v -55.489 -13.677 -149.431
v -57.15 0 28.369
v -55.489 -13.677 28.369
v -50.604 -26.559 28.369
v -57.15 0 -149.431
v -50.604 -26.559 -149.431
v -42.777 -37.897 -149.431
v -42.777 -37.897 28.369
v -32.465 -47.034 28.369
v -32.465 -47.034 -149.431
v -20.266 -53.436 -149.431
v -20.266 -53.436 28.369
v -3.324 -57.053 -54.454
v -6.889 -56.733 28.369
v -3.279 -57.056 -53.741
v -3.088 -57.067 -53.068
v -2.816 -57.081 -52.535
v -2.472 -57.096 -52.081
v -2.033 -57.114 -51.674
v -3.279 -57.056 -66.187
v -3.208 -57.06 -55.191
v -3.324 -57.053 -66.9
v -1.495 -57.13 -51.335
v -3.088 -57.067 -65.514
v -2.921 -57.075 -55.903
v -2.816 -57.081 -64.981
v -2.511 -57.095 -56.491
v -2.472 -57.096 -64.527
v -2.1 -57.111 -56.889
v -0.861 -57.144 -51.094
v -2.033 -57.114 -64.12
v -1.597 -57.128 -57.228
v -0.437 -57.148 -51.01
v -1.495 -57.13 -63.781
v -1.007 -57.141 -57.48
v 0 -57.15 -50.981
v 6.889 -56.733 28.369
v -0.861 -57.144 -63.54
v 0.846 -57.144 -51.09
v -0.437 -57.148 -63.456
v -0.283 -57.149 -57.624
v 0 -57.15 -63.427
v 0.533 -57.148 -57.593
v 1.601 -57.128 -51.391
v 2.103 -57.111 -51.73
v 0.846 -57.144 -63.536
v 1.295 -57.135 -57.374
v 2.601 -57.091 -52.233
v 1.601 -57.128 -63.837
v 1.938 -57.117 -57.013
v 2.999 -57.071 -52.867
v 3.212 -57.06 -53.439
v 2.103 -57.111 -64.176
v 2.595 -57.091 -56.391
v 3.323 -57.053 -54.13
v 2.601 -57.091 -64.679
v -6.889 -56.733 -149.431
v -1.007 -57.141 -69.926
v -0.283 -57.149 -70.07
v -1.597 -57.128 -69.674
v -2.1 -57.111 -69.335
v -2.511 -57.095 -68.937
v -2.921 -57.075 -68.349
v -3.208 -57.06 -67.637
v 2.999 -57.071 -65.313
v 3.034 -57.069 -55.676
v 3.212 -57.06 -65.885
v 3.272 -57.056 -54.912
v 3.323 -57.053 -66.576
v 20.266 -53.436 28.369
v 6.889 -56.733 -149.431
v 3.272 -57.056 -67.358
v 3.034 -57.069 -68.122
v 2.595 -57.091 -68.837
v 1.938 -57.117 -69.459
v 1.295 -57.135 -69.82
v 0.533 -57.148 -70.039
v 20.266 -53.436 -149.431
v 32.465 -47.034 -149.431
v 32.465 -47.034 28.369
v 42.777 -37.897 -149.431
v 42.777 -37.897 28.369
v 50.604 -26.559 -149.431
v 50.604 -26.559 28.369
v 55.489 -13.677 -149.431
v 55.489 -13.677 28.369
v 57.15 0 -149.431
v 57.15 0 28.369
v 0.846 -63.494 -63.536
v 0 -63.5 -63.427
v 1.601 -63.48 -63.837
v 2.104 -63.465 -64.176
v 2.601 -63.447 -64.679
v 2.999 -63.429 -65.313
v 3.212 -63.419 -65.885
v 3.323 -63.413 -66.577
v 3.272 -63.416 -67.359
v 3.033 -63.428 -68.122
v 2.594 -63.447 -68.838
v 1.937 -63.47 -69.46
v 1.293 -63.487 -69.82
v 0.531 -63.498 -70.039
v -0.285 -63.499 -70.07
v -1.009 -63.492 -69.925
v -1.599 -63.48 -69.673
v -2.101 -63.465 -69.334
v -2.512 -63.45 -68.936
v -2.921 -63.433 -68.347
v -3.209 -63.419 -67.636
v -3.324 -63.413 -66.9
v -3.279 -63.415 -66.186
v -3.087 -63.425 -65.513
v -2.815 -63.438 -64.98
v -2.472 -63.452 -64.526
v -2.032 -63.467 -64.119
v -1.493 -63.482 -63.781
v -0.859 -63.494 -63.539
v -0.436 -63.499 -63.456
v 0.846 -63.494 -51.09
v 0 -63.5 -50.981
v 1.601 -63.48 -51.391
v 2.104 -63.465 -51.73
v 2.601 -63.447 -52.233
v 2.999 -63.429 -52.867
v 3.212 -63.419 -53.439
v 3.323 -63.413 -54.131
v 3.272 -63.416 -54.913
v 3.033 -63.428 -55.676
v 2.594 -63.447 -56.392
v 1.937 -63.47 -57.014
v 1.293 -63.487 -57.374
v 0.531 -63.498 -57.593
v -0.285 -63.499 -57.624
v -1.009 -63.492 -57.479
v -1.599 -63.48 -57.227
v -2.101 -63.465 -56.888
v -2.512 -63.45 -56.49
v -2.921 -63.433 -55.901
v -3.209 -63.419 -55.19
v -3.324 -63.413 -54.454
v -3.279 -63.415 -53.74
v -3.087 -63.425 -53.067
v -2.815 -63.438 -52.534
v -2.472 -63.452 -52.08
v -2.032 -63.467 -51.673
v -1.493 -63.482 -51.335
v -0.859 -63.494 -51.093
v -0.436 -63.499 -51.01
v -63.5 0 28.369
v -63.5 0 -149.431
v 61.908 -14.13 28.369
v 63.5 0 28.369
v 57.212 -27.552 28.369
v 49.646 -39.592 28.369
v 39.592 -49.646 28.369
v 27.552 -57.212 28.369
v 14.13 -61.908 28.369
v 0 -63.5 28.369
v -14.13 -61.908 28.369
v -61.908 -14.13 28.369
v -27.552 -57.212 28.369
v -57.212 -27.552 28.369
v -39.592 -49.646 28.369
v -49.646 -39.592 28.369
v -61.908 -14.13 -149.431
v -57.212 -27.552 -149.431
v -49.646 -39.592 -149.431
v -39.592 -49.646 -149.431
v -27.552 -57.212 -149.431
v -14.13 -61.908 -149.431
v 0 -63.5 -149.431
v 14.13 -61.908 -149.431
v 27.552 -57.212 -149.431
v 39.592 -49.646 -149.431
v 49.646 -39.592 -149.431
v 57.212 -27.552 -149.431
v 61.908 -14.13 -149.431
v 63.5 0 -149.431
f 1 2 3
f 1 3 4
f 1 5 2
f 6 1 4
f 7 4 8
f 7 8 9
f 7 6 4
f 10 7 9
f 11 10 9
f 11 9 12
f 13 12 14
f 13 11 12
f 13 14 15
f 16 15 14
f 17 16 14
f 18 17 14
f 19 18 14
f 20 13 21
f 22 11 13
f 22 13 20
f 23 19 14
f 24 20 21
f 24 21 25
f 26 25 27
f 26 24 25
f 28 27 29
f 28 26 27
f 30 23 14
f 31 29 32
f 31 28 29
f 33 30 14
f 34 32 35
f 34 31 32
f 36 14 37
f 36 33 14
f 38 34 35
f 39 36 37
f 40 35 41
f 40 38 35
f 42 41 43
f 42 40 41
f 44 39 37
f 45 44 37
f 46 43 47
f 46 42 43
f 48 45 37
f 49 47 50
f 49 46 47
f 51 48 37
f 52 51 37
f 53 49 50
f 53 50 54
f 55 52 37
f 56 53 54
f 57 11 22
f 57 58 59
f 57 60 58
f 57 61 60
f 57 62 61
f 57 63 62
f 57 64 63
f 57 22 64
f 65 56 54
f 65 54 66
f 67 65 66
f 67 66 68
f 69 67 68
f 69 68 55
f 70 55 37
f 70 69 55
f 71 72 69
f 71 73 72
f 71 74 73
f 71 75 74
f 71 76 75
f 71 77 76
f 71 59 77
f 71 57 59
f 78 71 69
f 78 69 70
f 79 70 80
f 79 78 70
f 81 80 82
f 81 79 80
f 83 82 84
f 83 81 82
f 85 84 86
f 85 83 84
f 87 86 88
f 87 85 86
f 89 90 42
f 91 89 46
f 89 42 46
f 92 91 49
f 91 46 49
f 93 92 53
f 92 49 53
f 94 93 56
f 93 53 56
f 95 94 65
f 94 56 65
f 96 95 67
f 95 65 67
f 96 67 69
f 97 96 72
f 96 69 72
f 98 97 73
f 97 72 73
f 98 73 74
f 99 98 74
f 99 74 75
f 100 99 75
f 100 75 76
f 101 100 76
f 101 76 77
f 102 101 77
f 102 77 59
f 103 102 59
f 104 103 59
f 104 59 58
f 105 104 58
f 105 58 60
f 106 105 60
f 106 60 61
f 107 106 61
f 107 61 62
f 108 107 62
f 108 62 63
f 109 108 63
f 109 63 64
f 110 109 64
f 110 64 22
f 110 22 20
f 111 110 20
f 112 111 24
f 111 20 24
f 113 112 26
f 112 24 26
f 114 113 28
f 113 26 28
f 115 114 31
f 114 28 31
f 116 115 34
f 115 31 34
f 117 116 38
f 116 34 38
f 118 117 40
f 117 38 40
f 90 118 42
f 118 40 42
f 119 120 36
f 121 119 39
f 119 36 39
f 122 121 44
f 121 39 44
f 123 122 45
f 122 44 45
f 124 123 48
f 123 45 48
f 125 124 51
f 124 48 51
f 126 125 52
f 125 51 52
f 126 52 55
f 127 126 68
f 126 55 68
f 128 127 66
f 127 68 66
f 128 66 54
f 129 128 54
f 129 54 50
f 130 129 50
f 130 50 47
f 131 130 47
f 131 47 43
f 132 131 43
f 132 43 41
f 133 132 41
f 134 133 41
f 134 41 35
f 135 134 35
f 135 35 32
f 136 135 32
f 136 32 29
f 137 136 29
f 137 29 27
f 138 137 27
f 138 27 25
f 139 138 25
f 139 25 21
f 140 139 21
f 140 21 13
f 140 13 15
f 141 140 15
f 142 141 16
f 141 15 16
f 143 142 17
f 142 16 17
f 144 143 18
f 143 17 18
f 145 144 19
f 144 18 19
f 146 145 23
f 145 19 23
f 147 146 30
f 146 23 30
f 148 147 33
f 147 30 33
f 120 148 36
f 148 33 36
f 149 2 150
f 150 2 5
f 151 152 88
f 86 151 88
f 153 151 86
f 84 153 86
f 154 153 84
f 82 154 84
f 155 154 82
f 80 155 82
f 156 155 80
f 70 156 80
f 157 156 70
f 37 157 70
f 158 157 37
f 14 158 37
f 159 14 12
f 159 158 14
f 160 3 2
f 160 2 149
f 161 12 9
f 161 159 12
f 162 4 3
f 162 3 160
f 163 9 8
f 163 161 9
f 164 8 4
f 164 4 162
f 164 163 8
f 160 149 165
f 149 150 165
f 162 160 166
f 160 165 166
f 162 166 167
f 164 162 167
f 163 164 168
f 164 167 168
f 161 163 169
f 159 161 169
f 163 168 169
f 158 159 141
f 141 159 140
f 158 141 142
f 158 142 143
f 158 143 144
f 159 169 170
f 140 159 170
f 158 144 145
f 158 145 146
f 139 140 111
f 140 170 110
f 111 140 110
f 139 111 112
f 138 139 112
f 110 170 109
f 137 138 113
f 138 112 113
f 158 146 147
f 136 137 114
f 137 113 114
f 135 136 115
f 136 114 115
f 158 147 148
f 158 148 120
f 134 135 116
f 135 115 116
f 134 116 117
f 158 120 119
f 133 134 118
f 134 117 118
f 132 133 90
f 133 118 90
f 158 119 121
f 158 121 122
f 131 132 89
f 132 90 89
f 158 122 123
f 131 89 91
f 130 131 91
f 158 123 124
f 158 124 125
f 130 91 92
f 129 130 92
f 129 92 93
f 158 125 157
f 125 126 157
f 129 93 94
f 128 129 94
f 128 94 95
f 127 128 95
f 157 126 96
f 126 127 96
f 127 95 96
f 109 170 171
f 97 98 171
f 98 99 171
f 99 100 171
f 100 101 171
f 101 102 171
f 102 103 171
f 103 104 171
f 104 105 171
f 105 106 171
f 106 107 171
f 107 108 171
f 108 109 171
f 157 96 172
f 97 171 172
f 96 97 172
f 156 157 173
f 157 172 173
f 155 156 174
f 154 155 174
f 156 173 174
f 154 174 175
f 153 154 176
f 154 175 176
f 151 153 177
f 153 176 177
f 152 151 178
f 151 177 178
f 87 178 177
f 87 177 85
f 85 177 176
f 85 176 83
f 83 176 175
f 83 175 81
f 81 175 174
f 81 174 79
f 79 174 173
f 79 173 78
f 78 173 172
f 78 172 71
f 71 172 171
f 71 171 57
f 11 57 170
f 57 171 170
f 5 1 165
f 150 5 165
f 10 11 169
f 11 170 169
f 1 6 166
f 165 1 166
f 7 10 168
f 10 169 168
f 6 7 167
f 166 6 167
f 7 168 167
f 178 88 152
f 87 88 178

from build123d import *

# Parameters (mm, degrees)
SKETCH2_W          = 177.8
SKETCH2_H          = 6.35
REVOLVE1_ANGLE     = 180
SKETCH3_R          = 3.327499949
CUT_EXTRUDE1_DEPTH = 175.339362144


with BuildPart() as part:
    # Sketch2 → Revolve1 (revolve)
    with BuildSketch(Plane(origin=(0, 0, 0), x_dir=(0, 0, -1), z_dir=(0, -1, 0))):
        with Locations((60.53129924, -60.325)):
            Rectangle(SKETCH2_W, SKETCH2_H)
    revolve(axis=Axis((0, 0, 0), (0, 0, 1)), revolution_arc=REVOLVE1_ANGLE)

    # Sketch3 → Cut-Extrude1 (cut, through all)
    with BuildSketch(Plane(origin=(0, 0, 0), x_dir=(1, 0, 0), z_dir=(0, 1, 0))):
        with Locations(Location((0, 66.75429924, 0), (0, 0, 270))):
            Circle(SKETCH3_R)
        with Locations(Location((0, 54.30829924, 0), (0, 0, 270))):
            Circle(SKETCH3_R)
    extrude(amount=-CUT_EXTRUDE1_DEPTH, mode=Mode.SUBTRACT)


solid = part.part
